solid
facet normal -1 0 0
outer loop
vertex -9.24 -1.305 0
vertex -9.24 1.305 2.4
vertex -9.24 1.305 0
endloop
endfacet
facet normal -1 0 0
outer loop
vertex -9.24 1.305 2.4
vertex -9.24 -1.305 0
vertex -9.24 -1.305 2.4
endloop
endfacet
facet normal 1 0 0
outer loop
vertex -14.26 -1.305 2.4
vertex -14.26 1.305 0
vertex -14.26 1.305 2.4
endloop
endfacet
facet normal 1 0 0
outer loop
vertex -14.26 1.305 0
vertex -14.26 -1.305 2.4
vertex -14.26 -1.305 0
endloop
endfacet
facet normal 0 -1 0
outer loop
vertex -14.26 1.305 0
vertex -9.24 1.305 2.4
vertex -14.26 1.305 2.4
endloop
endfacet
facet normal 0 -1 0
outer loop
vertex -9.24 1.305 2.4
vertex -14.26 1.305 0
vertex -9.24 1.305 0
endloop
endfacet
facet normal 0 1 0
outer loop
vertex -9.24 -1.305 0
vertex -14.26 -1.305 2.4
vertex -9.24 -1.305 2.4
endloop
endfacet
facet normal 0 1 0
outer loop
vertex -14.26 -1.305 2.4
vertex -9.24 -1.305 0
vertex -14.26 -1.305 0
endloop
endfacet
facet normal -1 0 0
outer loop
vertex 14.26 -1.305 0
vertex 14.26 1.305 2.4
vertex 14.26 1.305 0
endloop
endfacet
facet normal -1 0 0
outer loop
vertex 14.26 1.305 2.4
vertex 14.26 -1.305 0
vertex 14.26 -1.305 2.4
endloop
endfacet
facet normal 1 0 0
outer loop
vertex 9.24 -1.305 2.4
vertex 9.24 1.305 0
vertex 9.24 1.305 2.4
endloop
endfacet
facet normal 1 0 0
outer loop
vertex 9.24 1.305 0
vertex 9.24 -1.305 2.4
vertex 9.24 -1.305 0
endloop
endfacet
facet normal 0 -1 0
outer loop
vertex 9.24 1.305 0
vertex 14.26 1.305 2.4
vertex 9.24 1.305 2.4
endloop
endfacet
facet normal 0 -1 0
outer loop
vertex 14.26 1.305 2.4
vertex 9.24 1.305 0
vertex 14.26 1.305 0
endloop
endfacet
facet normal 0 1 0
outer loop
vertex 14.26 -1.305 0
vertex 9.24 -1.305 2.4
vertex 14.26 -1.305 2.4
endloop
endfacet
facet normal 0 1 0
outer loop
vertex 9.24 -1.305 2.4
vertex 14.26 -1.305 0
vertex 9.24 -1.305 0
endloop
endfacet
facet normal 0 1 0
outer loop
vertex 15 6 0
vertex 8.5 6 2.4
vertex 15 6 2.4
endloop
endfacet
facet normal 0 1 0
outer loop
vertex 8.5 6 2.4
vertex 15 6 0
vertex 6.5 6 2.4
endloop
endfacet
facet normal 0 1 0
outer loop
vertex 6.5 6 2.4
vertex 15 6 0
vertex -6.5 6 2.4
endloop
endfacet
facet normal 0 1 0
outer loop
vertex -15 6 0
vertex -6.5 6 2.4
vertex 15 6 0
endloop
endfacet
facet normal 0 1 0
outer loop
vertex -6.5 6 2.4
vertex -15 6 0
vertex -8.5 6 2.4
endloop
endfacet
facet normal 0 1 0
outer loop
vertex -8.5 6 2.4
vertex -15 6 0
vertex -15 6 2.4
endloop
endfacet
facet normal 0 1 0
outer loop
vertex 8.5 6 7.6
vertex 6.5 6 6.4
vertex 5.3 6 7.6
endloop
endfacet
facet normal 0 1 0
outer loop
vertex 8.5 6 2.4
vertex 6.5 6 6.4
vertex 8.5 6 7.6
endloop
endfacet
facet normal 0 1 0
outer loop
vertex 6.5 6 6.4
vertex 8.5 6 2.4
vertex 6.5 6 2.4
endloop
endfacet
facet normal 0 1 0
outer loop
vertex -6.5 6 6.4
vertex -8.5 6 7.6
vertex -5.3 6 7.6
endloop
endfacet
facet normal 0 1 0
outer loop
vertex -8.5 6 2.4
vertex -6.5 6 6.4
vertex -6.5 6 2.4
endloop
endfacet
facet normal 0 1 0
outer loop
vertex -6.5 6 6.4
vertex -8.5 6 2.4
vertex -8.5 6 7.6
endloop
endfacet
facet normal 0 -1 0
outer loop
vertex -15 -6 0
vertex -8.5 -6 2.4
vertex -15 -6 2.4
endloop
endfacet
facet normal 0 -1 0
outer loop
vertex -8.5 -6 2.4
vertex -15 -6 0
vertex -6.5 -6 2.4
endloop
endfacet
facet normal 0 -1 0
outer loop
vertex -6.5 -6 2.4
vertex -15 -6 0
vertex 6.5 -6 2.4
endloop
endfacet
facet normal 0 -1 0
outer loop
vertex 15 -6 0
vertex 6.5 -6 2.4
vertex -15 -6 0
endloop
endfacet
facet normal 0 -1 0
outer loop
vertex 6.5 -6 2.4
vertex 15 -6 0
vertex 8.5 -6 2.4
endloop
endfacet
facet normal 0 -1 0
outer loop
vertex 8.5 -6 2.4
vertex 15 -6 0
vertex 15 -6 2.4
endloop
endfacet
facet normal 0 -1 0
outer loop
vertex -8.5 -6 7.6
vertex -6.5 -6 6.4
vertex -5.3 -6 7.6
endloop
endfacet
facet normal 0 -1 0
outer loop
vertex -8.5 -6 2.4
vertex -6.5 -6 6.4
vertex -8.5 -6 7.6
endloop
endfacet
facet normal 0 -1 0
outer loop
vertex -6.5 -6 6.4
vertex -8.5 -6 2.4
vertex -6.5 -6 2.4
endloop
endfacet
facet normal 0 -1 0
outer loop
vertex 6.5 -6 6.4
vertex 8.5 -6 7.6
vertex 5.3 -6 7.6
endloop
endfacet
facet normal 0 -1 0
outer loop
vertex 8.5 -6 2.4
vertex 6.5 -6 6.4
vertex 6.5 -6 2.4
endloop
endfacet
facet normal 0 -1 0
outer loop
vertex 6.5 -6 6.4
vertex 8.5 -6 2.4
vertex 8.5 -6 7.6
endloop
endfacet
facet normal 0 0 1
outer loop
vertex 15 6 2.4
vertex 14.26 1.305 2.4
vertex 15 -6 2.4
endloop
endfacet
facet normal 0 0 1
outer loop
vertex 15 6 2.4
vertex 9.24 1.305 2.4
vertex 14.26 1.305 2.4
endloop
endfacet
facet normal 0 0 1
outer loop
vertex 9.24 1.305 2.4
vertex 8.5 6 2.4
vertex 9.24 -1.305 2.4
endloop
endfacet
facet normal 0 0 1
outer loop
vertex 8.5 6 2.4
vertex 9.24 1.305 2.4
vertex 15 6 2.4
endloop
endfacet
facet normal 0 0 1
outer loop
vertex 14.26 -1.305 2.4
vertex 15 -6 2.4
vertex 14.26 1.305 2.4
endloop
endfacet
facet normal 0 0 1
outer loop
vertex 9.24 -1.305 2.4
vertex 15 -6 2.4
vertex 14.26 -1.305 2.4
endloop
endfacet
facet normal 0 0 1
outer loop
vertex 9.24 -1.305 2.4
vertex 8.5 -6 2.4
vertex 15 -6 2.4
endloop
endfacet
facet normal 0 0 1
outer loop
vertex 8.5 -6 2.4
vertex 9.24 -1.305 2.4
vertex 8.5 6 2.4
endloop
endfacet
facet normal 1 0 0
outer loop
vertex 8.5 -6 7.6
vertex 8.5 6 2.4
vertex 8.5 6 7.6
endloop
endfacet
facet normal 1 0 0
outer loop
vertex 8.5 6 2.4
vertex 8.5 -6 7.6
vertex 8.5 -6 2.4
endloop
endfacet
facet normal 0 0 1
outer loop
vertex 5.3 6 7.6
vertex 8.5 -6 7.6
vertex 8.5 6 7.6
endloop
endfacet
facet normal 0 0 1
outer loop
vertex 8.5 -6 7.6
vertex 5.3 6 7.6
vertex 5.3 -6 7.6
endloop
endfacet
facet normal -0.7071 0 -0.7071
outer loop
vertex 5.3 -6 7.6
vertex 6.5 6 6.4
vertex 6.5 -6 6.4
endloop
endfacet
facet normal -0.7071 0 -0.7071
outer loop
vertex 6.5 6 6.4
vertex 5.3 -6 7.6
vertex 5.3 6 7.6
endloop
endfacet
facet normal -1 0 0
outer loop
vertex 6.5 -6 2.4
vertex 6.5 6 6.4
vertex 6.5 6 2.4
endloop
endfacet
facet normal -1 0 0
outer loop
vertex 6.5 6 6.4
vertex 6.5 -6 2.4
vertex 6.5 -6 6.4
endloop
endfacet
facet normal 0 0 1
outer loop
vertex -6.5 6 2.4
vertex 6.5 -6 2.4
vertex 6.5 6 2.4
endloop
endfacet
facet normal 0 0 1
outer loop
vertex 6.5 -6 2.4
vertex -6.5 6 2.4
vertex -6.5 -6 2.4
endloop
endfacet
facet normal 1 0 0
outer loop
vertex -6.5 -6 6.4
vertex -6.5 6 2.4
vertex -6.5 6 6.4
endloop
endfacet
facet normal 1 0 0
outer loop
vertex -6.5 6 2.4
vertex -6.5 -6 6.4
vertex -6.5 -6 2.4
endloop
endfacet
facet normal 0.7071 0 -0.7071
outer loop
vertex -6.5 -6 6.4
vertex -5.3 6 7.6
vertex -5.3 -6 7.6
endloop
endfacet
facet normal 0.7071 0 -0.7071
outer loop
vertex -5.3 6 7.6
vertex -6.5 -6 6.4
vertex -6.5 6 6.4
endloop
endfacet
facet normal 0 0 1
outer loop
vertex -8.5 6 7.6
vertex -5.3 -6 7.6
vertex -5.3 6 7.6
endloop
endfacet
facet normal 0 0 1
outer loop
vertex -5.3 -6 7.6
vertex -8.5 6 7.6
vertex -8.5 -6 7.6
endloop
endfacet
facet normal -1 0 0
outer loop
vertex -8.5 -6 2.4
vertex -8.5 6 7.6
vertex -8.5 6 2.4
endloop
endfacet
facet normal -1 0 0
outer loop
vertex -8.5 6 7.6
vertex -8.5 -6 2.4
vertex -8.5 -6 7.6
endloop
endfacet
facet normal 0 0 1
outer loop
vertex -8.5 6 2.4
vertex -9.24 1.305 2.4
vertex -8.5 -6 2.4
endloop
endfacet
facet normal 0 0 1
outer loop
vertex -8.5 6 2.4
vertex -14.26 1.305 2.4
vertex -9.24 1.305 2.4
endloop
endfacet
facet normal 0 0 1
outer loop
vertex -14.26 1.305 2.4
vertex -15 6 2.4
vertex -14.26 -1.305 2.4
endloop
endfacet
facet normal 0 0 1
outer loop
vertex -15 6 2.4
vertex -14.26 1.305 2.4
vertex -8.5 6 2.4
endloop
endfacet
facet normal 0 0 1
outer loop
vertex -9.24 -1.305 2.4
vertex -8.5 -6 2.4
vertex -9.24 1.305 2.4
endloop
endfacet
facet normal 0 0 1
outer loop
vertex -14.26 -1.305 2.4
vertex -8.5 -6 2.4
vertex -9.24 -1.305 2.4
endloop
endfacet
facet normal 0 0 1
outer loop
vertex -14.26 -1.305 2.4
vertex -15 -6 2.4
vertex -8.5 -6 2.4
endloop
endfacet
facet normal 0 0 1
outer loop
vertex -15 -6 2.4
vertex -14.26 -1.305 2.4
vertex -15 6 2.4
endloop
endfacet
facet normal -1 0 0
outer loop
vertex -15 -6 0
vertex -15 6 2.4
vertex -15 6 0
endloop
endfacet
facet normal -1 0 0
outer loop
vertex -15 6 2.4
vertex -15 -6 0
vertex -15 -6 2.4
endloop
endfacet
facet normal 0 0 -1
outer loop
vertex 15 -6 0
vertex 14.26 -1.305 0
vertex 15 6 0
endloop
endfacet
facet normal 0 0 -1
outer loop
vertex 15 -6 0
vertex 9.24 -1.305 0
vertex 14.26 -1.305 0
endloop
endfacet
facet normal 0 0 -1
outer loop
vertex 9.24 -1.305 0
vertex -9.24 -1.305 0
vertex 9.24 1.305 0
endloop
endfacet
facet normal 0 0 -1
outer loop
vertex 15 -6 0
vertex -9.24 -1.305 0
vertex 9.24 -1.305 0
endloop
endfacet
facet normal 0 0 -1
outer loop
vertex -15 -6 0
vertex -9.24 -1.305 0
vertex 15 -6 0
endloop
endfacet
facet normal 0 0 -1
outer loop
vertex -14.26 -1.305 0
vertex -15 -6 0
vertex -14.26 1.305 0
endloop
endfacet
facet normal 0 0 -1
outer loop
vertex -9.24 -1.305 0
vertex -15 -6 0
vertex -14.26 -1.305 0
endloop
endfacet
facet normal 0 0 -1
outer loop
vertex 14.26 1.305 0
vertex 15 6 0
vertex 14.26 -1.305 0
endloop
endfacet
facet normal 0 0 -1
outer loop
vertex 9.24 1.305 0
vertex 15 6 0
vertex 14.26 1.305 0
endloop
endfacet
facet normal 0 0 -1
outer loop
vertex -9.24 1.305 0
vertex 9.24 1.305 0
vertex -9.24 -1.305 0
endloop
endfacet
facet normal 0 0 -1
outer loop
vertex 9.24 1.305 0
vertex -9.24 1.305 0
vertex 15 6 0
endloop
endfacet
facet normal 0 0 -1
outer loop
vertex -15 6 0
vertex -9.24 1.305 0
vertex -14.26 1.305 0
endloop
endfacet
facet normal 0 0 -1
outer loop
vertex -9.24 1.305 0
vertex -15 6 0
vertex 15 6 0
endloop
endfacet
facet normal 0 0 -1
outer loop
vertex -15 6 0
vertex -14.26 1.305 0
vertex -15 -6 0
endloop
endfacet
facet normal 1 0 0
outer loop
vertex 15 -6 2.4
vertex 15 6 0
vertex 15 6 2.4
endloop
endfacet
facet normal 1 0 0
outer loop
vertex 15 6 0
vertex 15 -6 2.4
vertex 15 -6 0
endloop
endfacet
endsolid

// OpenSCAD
// file: params.scad
// ─────────────────────────────────────────────────────────────────────────────
//  MotoGlow enclosure — parameters
//
//  Everything dimensional lives here. Change a number, re-run build.sh, get new
//  STLs. That is the whole reason this is OpenSCAD and not a mesh someone drew
//  once: the PCB will change size at least twice before you are done.
// ─────────────────────────────────────────────────────────────────────────────

/* [Printer fit] */
// Extra clearance on every mating surface. 0.20 suits a well-tuned X1C in ASA.
// Raise to 0.30 if the lid is tight, lower to 0.15 if it rattles.
fit           = 0.20;
// ASA shrinks as it cools. 1.004 adds 0.4% so holes land on size.
shrink        = 1.004;

/* [PCB] */
pcb_x         = 75.0;
pcb_y         = 55.0;
pcb_t         = 1.6;
pcb_standoff  = 4.0;    // clearance under the board for clipped through-hole leads
pcb_hole_inset= 3.5;    // mounting-hole centres, in from each corner
pcb_screw     = 2.5;    // M2.5 board screws

/* [Shell] */
wall          = 2.8;
floor_t       = 2.8;
lid_t         = 3.0;
inner_margin  = 2.0;    // air gap between PCB edge and wall
// Interior height is driven by the panel connectors, not by the components:
// an SP13 body must sit entirely above the PCB, and its nut (~20 mm across)
// must clear the board edge. That sets the minimum. See port_z below.
inner_h       = 31.0;   // floor to rim, inside
corner_r      = 4.0;

/* [Seal] */
// 2 mm silicone O-ring cord stock, joined into a loop with cyanoacrylate.
// The groove compresses it to 1.5 mm — about 25%, which is the right range for
// a printed sealing face. Thinner cord does not tolerate layer lines.
cord_d        = 2.0;
groove_w      = cord_d * 1.2;
groove_d      = cord_d * 0.75;
rim_w         = 5.2;    // rim thickness carrying the groove

/* [Lid fixing] */
// Screws sit OUTBOARD of the gasket, so a screw hole that takes on water
// cannot feed it into the box. This is why the flange exists at all.
// Screw ears are discrete, not a continuous flange: a flange all the way round
// would sit directly over the port holes and cap them off.
flange_w      = 6.5;         // how far a screw ear stands off the shell wall
ear_h         = 8.0;         // enough depth to swallow the heat-set insert
ear_d         = 10.0;        // ear boss diameter; 3 mm of ASA around an M3 insert
lid_screw     = 3.0;         // M3
insert_d      = 4.0;         // M3 brass heat-set insert, outer diameter
insert_h      = 5.7;
boss_d        = 7.0;
n_screws_long = 3;           // per long side (corners + one mid-span)
n_screws_short= 2;           // per short side (the corners, shared)

/* [Ports] */
// SP13 4-pin panel connectors: 13 mm threaded barrel, ~20 mm nut across flats.
// port_z is the hole centre above the inside floor. It is set 11 mm above the
// top of the PCB so the nut, which reaches ~10 mm out from the hole centre,
// passes clear over the board edge instead of fouling it.
sp13_hole     = 13.2;
sp13_nut_r    = 10.0;        // clearance radius needed inside for the nut
port_z        = pcb_standoff + pcb_t + 11.0;
// M12 cable gland for the permanently-wired battery feed.
gland_hole    = 12.2;

/* [Mounting] */
// The floor is never cut for mounting — a hole through a sealed floor is a leak
// waiting to happen. The box always has flat zip-tie wings, and if you want it
// on a frame tube you print the separate saddle part and zip-tie the box to
// that. Set tube_dia to the tube you are clamping to.
tube_dia      = 28.0;
wing_w        = 16.0;
wing_t        = 4.0;
tie_slot_w    = 5.0;         // fits a standard 4.8 mm zip tie
tie_slot_h    = 2.6;

/* [Cosmetic] */
emboss_text   = true;
label         = "MOTOGLOW";

// ─── Derived ────────────────────────────────────────────────────────────────
inner_x  = pcb_x + 2*inner_margin;
inner_y  = pcb_y + 2*inner_margin;
shell_x  = inner_x + 2*rim_w;
shell_y  = inner_y + 2*rim_w;
outer_x  = shell_x + 2*flange_w;
outer_y  = shell_y + 2*flange_w;
tub_h    = floor_t + inner_h;

$fn = 64;
// main file
// ─────────────────────────────────────────────────────────────────────────────
//  MotoGlow — strip mounting hardware
//
//  The 3M tape on the back of an LED strip is fine on a desk and useless on a
//  motorcycle: heat cycling, vibration and pressure washing all beat it. These
//  clips carry the load mechanically; the tape only has to hold the strip
//  against the clip while you fit it.
//
//      openscad -D 'part="clip"'    -o clip.stl    strip_parts.scad
//      openscad -D 'part="endcap"'  -o endcap.stl  strip_parts.scad
//      openscad -D 'part="clip_x8"' -o clip_x8.stl strip_parts.scad
// ─────────────────────────────────────────────────────────────────────────────
include <params.scad>

part = "clip";

// The default strip is 12 mm wide FCOB in an IP67 silicone sleeve, which
// measures about 12.6 x 3.6 mm once the sleeve is allowed for. Measure yours.
strip_w   = 12.6;
strip_h   = 3.6;
clip_wall = 2.0;
clip_len  = 12.0;        // along the strip
lip       = 1.2;         // how far the lips fold over the strip (also their height)

// ─── Clip ────────────────────────────────────────────────────────────────────
// A C-channel the strip presses into, on a base with two zip-tie wings.
// The lip undersides are 45 degrees, which does two things at once: pressing
// the strip down wedges the lips apart so it snaps in, and the overhang prints
// cleanly with no support.
clip_base   = 2.4;       // base plate thickness under the strip
clip_wing   = 6.5;       // how far the tie wings stick out past each wall

module _clip_profile() {
  ow = strip_w + 2*clip_wall + 2*fit;
  ch = strip_h + 2*fit;                     // channel height
  cw = strip_w + 2*fit;                     // channel width
  mw = cw - 2*lip;                          // mouth width, narrower than the strip
  difference() {
    // Body: walls plus base, with the wings either side.
    union() {
      translate([-ow/2, 0]) square([ow, clip_base + ch + lip]);
      translate([-ow/2 - clip_wing, 0]) square([ow + 2*clip_wing, clip_base]);
    }
    // Channel, with the 45 degree lip undersides built into the cut.
    polygon([
      [-cw/2, clip_base],
      [ cw/2, clip_base],
      [ cw/2, clip_base + ch],
      [ mw/2, clip_base + ch + lip],        // 45 deg because lip height == lip inset
      [ mw/2, clip_base + ch + lip + 4],
      [-mw/2, clip_base + ch + lip + 4],
      [-mw/2, clip_base + ch + lip],
      [-cw/2, clip_base + ch],
    ]);
  }
}

module strip_clip() {
  ow = strip_w + 2*clip_wall + 2*fit;
  difference() {
    rotate([90, 0, 0])
      linear_extrude(height = clip_len, center = true)
        _clip_profile();
    // Tie slot in each wing: the tie passes up through one, around the tube or
    // frame member, and down through the other.
    for (sx = [-1, 1])
      translate([sx * (ow/2 + clip_wing/2), 0, clip_base/2])
        cube([tie_slot_w * shrink, tie_slot_h * shrink, clip_base + 2], center = true);
  }
}

// ─── Cut-end cap ─────────────────────────────────────────────────────────────
// Every cut you make in the strip is a hole straight into the electronics. Fill
// this cup with neutral-cure silicone, push it onto the cut end, then slide
// adhesive-lined heatshrink over the whole joint. That end is then better
// sealed than the factory one.
module strip_endcap() {
  ow = strip_w + 2*1.6 + 2*fit;
  oh = strip_h + 2*1.6 + 2*fit;
  d  = 9.0;    // how far it swallows the strip
  difference() {
    translate([-ow/2, -oh/2, 0]) cube([ow, oh, d + 1.6]);
    translate([0, 0, -0.01])
      cube([strip_w + 2*fit, strip_h + 2*fit, 2*d], center = true);
    // Bleed hole so trapped silicone can escape rather than push the cap off
    translate([0, 0, d + 1.6 - 0.8]) cylinder(d = 2.0, h = 3, center = true);
  }
}

if      (part == "clip")    strip_clip();
else if (part == "endcap")  strip_endcap();
else if (part == "clip_x8") for (i = [0:7]) translate([0, i * (clip_len + 4), 0]) strip_clip();
else if (part == "endcap_x4") for (i = [0:3]) translate([i * 22, 0, 0]) strip_endcap();
